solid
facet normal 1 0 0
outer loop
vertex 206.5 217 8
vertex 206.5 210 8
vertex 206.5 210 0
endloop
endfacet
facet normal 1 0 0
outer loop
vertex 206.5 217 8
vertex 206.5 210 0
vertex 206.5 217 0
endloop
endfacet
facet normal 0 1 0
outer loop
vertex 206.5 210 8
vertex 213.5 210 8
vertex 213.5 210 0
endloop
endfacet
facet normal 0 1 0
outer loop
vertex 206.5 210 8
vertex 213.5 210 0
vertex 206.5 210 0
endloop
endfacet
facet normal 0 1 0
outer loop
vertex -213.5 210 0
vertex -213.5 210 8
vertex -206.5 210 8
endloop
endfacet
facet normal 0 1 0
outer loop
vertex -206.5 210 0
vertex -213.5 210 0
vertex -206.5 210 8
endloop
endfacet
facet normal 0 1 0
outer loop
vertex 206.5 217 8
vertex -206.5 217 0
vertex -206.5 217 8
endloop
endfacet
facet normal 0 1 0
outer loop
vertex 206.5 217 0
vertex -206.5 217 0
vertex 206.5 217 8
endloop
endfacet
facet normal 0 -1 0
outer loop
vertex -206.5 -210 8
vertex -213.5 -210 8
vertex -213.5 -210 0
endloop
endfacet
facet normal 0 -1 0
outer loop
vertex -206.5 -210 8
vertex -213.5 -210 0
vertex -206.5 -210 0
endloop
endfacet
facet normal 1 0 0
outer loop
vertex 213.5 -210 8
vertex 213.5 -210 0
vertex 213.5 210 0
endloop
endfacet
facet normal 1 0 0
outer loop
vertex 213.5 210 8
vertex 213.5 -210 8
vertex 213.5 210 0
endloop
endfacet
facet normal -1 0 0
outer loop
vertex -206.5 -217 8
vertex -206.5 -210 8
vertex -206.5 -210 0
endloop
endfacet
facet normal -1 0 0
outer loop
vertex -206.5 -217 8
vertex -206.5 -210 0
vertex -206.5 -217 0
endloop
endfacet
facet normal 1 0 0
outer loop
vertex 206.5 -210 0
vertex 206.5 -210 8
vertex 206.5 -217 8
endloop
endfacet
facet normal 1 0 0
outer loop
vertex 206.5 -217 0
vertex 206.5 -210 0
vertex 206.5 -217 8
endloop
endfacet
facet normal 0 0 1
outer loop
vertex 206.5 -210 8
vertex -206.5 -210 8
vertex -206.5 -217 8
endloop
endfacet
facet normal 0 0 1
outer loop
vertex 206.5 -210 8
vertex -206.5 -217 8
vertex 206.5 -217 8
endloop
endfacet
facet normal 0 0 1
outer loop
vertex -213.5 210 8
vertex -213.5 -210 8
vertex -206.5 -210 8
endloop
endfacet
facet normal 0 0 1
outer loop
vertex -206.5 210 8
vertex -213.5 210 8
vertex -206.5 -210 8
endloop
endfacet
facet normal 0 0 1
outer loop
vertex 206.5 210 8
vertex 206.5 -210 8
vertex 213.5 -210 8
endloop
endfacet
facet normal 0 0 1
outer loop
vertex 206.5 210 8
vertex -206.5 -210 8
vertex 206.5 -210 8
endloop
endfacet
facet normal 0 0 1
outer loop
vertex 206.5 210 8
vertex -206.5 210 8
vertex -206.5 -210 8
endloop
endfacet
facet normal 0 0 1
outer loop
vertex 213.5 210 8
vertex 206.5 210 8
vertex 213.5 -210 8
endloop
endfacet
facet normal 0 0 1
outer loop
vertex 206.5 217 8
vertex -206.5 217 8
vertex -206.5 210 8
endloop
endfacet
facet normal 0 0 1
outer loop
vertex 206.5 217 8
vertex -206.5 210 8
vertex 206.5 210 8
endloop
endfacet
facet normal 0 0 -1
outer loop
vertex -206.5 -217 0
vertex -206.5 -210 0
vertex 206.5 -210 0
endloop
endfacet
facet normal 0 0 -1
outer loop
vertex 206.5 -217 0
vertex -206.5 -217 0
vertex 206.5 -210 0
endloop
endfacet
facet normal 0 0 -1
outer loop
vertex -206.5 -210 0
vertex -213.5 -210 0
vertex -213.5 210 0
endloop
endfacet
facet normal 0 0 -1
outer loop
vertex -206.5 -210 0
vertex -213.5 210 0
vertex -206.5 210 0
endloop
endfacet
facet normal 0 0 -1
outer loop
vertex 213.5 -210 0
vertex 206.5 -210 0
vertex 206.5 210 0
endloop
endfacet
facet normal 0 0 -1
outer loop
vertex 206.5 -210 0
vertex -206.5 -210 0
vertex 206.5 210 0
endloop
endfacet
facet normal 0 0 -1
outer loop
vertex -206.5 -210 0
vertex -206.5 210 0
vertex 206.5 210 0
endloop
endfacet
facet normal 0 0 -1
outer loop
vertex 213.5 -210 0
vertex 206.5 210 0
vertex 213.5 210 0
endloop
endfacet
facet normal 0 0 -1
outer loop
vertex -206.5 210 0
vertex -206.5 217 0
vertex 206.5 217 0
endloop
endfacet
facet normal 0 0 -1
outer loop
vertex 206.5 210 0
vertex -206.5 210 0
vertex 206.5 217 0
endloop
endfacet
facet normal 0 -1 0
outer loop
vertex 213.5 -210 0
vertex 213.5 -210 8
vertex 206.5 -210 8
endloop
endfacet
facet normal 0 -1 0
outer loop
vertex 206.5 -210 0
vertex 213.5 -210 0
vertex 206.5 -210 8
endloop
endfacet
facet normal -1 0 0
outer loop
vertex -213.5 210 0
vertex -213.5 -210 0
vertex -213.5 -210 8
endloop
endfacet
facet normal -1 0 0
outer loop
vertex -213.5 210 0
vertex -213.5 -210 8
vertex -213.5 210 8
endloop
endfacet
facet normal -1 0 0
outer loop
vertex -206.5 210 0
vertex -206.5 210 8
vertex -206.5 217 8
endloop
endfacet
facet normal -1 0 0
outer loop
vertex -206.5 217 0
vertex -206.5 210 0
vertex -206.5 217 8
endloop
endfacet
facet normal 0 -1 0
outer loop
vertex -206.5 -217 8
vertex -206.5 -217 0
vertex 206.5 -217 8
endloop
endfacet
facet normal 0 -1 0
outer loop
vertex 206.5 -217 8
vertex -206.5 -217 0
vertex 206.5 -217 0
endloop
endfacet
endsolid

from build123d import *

# Parameters (mm, degrees)
SKETCH1_W               = 427
SKETCH1_H               = 434
BOSS_EXTRUDE1_DEPTH     = 8
SKETCH2_W               = 7
SKETCH2_H               = 7
CUT_EXTRUDE1_DEPTH      = 8
MIRROR2_COPY_1_SKETCH_W = 7
MIRROR2_COPY_1_SKETCH_H = 7
MIRROR2_COPY_1_DEPTH    = 8


with BuildPart() as part:
    # Sketch1 → Boss-Extrude1 (new body)
    with BuildSketch(Plane.XY):
        Rectangle(SKETCH1_W, SKETCH1_H)
    extrude(amount=BOSS_EXTRUDE1_DEPTH)

    # Sketch2 → Cut-Extrude1 (cut)
    with BuildSketch(Plane.XY.offset(8)):
        with Locations((-210, 213.5)):
            Rectangle(SKETCH2_W, SKETCH2_H)
    cut_extrude1 = extrude(amount=-CUT_EXTRUDE1_DEPTH, mode=Mode.SUBTRACT)

    # Mirror1: Cut-Extrude1 across plane
    add(cut_extrude1.mirror(Plane(origin=(0, 0, 0), x_dir=(0, 0, 1), z_dir=(1, 0, 0))), mode=Mode.SUBTRACT)

    # Mirror2: Cut-Extrude1 across plane
    add(cut_extrude1.mirror(Plane.ZX), mode=Mode.SUBTRACT)

    # Mirror2 copy 1 sketch → Mirror2 copy 1 (cut)
    with BuildSketch(Plane(origin=(0, 0, 8), x_dir=(-1, 0, 0), z_dir=(0, 0, 1))):
        with Locations((-210, 213.5)):
            Rectangle(MIRROR2_COPY_1_SKETCH_W, MIRROR2_COPY_1_SKETCH_H)
    extrude(amount=-MIRROR2_COPY_1_DEPTH, mode=Mode.SUBTRACT)


solid = part.part
